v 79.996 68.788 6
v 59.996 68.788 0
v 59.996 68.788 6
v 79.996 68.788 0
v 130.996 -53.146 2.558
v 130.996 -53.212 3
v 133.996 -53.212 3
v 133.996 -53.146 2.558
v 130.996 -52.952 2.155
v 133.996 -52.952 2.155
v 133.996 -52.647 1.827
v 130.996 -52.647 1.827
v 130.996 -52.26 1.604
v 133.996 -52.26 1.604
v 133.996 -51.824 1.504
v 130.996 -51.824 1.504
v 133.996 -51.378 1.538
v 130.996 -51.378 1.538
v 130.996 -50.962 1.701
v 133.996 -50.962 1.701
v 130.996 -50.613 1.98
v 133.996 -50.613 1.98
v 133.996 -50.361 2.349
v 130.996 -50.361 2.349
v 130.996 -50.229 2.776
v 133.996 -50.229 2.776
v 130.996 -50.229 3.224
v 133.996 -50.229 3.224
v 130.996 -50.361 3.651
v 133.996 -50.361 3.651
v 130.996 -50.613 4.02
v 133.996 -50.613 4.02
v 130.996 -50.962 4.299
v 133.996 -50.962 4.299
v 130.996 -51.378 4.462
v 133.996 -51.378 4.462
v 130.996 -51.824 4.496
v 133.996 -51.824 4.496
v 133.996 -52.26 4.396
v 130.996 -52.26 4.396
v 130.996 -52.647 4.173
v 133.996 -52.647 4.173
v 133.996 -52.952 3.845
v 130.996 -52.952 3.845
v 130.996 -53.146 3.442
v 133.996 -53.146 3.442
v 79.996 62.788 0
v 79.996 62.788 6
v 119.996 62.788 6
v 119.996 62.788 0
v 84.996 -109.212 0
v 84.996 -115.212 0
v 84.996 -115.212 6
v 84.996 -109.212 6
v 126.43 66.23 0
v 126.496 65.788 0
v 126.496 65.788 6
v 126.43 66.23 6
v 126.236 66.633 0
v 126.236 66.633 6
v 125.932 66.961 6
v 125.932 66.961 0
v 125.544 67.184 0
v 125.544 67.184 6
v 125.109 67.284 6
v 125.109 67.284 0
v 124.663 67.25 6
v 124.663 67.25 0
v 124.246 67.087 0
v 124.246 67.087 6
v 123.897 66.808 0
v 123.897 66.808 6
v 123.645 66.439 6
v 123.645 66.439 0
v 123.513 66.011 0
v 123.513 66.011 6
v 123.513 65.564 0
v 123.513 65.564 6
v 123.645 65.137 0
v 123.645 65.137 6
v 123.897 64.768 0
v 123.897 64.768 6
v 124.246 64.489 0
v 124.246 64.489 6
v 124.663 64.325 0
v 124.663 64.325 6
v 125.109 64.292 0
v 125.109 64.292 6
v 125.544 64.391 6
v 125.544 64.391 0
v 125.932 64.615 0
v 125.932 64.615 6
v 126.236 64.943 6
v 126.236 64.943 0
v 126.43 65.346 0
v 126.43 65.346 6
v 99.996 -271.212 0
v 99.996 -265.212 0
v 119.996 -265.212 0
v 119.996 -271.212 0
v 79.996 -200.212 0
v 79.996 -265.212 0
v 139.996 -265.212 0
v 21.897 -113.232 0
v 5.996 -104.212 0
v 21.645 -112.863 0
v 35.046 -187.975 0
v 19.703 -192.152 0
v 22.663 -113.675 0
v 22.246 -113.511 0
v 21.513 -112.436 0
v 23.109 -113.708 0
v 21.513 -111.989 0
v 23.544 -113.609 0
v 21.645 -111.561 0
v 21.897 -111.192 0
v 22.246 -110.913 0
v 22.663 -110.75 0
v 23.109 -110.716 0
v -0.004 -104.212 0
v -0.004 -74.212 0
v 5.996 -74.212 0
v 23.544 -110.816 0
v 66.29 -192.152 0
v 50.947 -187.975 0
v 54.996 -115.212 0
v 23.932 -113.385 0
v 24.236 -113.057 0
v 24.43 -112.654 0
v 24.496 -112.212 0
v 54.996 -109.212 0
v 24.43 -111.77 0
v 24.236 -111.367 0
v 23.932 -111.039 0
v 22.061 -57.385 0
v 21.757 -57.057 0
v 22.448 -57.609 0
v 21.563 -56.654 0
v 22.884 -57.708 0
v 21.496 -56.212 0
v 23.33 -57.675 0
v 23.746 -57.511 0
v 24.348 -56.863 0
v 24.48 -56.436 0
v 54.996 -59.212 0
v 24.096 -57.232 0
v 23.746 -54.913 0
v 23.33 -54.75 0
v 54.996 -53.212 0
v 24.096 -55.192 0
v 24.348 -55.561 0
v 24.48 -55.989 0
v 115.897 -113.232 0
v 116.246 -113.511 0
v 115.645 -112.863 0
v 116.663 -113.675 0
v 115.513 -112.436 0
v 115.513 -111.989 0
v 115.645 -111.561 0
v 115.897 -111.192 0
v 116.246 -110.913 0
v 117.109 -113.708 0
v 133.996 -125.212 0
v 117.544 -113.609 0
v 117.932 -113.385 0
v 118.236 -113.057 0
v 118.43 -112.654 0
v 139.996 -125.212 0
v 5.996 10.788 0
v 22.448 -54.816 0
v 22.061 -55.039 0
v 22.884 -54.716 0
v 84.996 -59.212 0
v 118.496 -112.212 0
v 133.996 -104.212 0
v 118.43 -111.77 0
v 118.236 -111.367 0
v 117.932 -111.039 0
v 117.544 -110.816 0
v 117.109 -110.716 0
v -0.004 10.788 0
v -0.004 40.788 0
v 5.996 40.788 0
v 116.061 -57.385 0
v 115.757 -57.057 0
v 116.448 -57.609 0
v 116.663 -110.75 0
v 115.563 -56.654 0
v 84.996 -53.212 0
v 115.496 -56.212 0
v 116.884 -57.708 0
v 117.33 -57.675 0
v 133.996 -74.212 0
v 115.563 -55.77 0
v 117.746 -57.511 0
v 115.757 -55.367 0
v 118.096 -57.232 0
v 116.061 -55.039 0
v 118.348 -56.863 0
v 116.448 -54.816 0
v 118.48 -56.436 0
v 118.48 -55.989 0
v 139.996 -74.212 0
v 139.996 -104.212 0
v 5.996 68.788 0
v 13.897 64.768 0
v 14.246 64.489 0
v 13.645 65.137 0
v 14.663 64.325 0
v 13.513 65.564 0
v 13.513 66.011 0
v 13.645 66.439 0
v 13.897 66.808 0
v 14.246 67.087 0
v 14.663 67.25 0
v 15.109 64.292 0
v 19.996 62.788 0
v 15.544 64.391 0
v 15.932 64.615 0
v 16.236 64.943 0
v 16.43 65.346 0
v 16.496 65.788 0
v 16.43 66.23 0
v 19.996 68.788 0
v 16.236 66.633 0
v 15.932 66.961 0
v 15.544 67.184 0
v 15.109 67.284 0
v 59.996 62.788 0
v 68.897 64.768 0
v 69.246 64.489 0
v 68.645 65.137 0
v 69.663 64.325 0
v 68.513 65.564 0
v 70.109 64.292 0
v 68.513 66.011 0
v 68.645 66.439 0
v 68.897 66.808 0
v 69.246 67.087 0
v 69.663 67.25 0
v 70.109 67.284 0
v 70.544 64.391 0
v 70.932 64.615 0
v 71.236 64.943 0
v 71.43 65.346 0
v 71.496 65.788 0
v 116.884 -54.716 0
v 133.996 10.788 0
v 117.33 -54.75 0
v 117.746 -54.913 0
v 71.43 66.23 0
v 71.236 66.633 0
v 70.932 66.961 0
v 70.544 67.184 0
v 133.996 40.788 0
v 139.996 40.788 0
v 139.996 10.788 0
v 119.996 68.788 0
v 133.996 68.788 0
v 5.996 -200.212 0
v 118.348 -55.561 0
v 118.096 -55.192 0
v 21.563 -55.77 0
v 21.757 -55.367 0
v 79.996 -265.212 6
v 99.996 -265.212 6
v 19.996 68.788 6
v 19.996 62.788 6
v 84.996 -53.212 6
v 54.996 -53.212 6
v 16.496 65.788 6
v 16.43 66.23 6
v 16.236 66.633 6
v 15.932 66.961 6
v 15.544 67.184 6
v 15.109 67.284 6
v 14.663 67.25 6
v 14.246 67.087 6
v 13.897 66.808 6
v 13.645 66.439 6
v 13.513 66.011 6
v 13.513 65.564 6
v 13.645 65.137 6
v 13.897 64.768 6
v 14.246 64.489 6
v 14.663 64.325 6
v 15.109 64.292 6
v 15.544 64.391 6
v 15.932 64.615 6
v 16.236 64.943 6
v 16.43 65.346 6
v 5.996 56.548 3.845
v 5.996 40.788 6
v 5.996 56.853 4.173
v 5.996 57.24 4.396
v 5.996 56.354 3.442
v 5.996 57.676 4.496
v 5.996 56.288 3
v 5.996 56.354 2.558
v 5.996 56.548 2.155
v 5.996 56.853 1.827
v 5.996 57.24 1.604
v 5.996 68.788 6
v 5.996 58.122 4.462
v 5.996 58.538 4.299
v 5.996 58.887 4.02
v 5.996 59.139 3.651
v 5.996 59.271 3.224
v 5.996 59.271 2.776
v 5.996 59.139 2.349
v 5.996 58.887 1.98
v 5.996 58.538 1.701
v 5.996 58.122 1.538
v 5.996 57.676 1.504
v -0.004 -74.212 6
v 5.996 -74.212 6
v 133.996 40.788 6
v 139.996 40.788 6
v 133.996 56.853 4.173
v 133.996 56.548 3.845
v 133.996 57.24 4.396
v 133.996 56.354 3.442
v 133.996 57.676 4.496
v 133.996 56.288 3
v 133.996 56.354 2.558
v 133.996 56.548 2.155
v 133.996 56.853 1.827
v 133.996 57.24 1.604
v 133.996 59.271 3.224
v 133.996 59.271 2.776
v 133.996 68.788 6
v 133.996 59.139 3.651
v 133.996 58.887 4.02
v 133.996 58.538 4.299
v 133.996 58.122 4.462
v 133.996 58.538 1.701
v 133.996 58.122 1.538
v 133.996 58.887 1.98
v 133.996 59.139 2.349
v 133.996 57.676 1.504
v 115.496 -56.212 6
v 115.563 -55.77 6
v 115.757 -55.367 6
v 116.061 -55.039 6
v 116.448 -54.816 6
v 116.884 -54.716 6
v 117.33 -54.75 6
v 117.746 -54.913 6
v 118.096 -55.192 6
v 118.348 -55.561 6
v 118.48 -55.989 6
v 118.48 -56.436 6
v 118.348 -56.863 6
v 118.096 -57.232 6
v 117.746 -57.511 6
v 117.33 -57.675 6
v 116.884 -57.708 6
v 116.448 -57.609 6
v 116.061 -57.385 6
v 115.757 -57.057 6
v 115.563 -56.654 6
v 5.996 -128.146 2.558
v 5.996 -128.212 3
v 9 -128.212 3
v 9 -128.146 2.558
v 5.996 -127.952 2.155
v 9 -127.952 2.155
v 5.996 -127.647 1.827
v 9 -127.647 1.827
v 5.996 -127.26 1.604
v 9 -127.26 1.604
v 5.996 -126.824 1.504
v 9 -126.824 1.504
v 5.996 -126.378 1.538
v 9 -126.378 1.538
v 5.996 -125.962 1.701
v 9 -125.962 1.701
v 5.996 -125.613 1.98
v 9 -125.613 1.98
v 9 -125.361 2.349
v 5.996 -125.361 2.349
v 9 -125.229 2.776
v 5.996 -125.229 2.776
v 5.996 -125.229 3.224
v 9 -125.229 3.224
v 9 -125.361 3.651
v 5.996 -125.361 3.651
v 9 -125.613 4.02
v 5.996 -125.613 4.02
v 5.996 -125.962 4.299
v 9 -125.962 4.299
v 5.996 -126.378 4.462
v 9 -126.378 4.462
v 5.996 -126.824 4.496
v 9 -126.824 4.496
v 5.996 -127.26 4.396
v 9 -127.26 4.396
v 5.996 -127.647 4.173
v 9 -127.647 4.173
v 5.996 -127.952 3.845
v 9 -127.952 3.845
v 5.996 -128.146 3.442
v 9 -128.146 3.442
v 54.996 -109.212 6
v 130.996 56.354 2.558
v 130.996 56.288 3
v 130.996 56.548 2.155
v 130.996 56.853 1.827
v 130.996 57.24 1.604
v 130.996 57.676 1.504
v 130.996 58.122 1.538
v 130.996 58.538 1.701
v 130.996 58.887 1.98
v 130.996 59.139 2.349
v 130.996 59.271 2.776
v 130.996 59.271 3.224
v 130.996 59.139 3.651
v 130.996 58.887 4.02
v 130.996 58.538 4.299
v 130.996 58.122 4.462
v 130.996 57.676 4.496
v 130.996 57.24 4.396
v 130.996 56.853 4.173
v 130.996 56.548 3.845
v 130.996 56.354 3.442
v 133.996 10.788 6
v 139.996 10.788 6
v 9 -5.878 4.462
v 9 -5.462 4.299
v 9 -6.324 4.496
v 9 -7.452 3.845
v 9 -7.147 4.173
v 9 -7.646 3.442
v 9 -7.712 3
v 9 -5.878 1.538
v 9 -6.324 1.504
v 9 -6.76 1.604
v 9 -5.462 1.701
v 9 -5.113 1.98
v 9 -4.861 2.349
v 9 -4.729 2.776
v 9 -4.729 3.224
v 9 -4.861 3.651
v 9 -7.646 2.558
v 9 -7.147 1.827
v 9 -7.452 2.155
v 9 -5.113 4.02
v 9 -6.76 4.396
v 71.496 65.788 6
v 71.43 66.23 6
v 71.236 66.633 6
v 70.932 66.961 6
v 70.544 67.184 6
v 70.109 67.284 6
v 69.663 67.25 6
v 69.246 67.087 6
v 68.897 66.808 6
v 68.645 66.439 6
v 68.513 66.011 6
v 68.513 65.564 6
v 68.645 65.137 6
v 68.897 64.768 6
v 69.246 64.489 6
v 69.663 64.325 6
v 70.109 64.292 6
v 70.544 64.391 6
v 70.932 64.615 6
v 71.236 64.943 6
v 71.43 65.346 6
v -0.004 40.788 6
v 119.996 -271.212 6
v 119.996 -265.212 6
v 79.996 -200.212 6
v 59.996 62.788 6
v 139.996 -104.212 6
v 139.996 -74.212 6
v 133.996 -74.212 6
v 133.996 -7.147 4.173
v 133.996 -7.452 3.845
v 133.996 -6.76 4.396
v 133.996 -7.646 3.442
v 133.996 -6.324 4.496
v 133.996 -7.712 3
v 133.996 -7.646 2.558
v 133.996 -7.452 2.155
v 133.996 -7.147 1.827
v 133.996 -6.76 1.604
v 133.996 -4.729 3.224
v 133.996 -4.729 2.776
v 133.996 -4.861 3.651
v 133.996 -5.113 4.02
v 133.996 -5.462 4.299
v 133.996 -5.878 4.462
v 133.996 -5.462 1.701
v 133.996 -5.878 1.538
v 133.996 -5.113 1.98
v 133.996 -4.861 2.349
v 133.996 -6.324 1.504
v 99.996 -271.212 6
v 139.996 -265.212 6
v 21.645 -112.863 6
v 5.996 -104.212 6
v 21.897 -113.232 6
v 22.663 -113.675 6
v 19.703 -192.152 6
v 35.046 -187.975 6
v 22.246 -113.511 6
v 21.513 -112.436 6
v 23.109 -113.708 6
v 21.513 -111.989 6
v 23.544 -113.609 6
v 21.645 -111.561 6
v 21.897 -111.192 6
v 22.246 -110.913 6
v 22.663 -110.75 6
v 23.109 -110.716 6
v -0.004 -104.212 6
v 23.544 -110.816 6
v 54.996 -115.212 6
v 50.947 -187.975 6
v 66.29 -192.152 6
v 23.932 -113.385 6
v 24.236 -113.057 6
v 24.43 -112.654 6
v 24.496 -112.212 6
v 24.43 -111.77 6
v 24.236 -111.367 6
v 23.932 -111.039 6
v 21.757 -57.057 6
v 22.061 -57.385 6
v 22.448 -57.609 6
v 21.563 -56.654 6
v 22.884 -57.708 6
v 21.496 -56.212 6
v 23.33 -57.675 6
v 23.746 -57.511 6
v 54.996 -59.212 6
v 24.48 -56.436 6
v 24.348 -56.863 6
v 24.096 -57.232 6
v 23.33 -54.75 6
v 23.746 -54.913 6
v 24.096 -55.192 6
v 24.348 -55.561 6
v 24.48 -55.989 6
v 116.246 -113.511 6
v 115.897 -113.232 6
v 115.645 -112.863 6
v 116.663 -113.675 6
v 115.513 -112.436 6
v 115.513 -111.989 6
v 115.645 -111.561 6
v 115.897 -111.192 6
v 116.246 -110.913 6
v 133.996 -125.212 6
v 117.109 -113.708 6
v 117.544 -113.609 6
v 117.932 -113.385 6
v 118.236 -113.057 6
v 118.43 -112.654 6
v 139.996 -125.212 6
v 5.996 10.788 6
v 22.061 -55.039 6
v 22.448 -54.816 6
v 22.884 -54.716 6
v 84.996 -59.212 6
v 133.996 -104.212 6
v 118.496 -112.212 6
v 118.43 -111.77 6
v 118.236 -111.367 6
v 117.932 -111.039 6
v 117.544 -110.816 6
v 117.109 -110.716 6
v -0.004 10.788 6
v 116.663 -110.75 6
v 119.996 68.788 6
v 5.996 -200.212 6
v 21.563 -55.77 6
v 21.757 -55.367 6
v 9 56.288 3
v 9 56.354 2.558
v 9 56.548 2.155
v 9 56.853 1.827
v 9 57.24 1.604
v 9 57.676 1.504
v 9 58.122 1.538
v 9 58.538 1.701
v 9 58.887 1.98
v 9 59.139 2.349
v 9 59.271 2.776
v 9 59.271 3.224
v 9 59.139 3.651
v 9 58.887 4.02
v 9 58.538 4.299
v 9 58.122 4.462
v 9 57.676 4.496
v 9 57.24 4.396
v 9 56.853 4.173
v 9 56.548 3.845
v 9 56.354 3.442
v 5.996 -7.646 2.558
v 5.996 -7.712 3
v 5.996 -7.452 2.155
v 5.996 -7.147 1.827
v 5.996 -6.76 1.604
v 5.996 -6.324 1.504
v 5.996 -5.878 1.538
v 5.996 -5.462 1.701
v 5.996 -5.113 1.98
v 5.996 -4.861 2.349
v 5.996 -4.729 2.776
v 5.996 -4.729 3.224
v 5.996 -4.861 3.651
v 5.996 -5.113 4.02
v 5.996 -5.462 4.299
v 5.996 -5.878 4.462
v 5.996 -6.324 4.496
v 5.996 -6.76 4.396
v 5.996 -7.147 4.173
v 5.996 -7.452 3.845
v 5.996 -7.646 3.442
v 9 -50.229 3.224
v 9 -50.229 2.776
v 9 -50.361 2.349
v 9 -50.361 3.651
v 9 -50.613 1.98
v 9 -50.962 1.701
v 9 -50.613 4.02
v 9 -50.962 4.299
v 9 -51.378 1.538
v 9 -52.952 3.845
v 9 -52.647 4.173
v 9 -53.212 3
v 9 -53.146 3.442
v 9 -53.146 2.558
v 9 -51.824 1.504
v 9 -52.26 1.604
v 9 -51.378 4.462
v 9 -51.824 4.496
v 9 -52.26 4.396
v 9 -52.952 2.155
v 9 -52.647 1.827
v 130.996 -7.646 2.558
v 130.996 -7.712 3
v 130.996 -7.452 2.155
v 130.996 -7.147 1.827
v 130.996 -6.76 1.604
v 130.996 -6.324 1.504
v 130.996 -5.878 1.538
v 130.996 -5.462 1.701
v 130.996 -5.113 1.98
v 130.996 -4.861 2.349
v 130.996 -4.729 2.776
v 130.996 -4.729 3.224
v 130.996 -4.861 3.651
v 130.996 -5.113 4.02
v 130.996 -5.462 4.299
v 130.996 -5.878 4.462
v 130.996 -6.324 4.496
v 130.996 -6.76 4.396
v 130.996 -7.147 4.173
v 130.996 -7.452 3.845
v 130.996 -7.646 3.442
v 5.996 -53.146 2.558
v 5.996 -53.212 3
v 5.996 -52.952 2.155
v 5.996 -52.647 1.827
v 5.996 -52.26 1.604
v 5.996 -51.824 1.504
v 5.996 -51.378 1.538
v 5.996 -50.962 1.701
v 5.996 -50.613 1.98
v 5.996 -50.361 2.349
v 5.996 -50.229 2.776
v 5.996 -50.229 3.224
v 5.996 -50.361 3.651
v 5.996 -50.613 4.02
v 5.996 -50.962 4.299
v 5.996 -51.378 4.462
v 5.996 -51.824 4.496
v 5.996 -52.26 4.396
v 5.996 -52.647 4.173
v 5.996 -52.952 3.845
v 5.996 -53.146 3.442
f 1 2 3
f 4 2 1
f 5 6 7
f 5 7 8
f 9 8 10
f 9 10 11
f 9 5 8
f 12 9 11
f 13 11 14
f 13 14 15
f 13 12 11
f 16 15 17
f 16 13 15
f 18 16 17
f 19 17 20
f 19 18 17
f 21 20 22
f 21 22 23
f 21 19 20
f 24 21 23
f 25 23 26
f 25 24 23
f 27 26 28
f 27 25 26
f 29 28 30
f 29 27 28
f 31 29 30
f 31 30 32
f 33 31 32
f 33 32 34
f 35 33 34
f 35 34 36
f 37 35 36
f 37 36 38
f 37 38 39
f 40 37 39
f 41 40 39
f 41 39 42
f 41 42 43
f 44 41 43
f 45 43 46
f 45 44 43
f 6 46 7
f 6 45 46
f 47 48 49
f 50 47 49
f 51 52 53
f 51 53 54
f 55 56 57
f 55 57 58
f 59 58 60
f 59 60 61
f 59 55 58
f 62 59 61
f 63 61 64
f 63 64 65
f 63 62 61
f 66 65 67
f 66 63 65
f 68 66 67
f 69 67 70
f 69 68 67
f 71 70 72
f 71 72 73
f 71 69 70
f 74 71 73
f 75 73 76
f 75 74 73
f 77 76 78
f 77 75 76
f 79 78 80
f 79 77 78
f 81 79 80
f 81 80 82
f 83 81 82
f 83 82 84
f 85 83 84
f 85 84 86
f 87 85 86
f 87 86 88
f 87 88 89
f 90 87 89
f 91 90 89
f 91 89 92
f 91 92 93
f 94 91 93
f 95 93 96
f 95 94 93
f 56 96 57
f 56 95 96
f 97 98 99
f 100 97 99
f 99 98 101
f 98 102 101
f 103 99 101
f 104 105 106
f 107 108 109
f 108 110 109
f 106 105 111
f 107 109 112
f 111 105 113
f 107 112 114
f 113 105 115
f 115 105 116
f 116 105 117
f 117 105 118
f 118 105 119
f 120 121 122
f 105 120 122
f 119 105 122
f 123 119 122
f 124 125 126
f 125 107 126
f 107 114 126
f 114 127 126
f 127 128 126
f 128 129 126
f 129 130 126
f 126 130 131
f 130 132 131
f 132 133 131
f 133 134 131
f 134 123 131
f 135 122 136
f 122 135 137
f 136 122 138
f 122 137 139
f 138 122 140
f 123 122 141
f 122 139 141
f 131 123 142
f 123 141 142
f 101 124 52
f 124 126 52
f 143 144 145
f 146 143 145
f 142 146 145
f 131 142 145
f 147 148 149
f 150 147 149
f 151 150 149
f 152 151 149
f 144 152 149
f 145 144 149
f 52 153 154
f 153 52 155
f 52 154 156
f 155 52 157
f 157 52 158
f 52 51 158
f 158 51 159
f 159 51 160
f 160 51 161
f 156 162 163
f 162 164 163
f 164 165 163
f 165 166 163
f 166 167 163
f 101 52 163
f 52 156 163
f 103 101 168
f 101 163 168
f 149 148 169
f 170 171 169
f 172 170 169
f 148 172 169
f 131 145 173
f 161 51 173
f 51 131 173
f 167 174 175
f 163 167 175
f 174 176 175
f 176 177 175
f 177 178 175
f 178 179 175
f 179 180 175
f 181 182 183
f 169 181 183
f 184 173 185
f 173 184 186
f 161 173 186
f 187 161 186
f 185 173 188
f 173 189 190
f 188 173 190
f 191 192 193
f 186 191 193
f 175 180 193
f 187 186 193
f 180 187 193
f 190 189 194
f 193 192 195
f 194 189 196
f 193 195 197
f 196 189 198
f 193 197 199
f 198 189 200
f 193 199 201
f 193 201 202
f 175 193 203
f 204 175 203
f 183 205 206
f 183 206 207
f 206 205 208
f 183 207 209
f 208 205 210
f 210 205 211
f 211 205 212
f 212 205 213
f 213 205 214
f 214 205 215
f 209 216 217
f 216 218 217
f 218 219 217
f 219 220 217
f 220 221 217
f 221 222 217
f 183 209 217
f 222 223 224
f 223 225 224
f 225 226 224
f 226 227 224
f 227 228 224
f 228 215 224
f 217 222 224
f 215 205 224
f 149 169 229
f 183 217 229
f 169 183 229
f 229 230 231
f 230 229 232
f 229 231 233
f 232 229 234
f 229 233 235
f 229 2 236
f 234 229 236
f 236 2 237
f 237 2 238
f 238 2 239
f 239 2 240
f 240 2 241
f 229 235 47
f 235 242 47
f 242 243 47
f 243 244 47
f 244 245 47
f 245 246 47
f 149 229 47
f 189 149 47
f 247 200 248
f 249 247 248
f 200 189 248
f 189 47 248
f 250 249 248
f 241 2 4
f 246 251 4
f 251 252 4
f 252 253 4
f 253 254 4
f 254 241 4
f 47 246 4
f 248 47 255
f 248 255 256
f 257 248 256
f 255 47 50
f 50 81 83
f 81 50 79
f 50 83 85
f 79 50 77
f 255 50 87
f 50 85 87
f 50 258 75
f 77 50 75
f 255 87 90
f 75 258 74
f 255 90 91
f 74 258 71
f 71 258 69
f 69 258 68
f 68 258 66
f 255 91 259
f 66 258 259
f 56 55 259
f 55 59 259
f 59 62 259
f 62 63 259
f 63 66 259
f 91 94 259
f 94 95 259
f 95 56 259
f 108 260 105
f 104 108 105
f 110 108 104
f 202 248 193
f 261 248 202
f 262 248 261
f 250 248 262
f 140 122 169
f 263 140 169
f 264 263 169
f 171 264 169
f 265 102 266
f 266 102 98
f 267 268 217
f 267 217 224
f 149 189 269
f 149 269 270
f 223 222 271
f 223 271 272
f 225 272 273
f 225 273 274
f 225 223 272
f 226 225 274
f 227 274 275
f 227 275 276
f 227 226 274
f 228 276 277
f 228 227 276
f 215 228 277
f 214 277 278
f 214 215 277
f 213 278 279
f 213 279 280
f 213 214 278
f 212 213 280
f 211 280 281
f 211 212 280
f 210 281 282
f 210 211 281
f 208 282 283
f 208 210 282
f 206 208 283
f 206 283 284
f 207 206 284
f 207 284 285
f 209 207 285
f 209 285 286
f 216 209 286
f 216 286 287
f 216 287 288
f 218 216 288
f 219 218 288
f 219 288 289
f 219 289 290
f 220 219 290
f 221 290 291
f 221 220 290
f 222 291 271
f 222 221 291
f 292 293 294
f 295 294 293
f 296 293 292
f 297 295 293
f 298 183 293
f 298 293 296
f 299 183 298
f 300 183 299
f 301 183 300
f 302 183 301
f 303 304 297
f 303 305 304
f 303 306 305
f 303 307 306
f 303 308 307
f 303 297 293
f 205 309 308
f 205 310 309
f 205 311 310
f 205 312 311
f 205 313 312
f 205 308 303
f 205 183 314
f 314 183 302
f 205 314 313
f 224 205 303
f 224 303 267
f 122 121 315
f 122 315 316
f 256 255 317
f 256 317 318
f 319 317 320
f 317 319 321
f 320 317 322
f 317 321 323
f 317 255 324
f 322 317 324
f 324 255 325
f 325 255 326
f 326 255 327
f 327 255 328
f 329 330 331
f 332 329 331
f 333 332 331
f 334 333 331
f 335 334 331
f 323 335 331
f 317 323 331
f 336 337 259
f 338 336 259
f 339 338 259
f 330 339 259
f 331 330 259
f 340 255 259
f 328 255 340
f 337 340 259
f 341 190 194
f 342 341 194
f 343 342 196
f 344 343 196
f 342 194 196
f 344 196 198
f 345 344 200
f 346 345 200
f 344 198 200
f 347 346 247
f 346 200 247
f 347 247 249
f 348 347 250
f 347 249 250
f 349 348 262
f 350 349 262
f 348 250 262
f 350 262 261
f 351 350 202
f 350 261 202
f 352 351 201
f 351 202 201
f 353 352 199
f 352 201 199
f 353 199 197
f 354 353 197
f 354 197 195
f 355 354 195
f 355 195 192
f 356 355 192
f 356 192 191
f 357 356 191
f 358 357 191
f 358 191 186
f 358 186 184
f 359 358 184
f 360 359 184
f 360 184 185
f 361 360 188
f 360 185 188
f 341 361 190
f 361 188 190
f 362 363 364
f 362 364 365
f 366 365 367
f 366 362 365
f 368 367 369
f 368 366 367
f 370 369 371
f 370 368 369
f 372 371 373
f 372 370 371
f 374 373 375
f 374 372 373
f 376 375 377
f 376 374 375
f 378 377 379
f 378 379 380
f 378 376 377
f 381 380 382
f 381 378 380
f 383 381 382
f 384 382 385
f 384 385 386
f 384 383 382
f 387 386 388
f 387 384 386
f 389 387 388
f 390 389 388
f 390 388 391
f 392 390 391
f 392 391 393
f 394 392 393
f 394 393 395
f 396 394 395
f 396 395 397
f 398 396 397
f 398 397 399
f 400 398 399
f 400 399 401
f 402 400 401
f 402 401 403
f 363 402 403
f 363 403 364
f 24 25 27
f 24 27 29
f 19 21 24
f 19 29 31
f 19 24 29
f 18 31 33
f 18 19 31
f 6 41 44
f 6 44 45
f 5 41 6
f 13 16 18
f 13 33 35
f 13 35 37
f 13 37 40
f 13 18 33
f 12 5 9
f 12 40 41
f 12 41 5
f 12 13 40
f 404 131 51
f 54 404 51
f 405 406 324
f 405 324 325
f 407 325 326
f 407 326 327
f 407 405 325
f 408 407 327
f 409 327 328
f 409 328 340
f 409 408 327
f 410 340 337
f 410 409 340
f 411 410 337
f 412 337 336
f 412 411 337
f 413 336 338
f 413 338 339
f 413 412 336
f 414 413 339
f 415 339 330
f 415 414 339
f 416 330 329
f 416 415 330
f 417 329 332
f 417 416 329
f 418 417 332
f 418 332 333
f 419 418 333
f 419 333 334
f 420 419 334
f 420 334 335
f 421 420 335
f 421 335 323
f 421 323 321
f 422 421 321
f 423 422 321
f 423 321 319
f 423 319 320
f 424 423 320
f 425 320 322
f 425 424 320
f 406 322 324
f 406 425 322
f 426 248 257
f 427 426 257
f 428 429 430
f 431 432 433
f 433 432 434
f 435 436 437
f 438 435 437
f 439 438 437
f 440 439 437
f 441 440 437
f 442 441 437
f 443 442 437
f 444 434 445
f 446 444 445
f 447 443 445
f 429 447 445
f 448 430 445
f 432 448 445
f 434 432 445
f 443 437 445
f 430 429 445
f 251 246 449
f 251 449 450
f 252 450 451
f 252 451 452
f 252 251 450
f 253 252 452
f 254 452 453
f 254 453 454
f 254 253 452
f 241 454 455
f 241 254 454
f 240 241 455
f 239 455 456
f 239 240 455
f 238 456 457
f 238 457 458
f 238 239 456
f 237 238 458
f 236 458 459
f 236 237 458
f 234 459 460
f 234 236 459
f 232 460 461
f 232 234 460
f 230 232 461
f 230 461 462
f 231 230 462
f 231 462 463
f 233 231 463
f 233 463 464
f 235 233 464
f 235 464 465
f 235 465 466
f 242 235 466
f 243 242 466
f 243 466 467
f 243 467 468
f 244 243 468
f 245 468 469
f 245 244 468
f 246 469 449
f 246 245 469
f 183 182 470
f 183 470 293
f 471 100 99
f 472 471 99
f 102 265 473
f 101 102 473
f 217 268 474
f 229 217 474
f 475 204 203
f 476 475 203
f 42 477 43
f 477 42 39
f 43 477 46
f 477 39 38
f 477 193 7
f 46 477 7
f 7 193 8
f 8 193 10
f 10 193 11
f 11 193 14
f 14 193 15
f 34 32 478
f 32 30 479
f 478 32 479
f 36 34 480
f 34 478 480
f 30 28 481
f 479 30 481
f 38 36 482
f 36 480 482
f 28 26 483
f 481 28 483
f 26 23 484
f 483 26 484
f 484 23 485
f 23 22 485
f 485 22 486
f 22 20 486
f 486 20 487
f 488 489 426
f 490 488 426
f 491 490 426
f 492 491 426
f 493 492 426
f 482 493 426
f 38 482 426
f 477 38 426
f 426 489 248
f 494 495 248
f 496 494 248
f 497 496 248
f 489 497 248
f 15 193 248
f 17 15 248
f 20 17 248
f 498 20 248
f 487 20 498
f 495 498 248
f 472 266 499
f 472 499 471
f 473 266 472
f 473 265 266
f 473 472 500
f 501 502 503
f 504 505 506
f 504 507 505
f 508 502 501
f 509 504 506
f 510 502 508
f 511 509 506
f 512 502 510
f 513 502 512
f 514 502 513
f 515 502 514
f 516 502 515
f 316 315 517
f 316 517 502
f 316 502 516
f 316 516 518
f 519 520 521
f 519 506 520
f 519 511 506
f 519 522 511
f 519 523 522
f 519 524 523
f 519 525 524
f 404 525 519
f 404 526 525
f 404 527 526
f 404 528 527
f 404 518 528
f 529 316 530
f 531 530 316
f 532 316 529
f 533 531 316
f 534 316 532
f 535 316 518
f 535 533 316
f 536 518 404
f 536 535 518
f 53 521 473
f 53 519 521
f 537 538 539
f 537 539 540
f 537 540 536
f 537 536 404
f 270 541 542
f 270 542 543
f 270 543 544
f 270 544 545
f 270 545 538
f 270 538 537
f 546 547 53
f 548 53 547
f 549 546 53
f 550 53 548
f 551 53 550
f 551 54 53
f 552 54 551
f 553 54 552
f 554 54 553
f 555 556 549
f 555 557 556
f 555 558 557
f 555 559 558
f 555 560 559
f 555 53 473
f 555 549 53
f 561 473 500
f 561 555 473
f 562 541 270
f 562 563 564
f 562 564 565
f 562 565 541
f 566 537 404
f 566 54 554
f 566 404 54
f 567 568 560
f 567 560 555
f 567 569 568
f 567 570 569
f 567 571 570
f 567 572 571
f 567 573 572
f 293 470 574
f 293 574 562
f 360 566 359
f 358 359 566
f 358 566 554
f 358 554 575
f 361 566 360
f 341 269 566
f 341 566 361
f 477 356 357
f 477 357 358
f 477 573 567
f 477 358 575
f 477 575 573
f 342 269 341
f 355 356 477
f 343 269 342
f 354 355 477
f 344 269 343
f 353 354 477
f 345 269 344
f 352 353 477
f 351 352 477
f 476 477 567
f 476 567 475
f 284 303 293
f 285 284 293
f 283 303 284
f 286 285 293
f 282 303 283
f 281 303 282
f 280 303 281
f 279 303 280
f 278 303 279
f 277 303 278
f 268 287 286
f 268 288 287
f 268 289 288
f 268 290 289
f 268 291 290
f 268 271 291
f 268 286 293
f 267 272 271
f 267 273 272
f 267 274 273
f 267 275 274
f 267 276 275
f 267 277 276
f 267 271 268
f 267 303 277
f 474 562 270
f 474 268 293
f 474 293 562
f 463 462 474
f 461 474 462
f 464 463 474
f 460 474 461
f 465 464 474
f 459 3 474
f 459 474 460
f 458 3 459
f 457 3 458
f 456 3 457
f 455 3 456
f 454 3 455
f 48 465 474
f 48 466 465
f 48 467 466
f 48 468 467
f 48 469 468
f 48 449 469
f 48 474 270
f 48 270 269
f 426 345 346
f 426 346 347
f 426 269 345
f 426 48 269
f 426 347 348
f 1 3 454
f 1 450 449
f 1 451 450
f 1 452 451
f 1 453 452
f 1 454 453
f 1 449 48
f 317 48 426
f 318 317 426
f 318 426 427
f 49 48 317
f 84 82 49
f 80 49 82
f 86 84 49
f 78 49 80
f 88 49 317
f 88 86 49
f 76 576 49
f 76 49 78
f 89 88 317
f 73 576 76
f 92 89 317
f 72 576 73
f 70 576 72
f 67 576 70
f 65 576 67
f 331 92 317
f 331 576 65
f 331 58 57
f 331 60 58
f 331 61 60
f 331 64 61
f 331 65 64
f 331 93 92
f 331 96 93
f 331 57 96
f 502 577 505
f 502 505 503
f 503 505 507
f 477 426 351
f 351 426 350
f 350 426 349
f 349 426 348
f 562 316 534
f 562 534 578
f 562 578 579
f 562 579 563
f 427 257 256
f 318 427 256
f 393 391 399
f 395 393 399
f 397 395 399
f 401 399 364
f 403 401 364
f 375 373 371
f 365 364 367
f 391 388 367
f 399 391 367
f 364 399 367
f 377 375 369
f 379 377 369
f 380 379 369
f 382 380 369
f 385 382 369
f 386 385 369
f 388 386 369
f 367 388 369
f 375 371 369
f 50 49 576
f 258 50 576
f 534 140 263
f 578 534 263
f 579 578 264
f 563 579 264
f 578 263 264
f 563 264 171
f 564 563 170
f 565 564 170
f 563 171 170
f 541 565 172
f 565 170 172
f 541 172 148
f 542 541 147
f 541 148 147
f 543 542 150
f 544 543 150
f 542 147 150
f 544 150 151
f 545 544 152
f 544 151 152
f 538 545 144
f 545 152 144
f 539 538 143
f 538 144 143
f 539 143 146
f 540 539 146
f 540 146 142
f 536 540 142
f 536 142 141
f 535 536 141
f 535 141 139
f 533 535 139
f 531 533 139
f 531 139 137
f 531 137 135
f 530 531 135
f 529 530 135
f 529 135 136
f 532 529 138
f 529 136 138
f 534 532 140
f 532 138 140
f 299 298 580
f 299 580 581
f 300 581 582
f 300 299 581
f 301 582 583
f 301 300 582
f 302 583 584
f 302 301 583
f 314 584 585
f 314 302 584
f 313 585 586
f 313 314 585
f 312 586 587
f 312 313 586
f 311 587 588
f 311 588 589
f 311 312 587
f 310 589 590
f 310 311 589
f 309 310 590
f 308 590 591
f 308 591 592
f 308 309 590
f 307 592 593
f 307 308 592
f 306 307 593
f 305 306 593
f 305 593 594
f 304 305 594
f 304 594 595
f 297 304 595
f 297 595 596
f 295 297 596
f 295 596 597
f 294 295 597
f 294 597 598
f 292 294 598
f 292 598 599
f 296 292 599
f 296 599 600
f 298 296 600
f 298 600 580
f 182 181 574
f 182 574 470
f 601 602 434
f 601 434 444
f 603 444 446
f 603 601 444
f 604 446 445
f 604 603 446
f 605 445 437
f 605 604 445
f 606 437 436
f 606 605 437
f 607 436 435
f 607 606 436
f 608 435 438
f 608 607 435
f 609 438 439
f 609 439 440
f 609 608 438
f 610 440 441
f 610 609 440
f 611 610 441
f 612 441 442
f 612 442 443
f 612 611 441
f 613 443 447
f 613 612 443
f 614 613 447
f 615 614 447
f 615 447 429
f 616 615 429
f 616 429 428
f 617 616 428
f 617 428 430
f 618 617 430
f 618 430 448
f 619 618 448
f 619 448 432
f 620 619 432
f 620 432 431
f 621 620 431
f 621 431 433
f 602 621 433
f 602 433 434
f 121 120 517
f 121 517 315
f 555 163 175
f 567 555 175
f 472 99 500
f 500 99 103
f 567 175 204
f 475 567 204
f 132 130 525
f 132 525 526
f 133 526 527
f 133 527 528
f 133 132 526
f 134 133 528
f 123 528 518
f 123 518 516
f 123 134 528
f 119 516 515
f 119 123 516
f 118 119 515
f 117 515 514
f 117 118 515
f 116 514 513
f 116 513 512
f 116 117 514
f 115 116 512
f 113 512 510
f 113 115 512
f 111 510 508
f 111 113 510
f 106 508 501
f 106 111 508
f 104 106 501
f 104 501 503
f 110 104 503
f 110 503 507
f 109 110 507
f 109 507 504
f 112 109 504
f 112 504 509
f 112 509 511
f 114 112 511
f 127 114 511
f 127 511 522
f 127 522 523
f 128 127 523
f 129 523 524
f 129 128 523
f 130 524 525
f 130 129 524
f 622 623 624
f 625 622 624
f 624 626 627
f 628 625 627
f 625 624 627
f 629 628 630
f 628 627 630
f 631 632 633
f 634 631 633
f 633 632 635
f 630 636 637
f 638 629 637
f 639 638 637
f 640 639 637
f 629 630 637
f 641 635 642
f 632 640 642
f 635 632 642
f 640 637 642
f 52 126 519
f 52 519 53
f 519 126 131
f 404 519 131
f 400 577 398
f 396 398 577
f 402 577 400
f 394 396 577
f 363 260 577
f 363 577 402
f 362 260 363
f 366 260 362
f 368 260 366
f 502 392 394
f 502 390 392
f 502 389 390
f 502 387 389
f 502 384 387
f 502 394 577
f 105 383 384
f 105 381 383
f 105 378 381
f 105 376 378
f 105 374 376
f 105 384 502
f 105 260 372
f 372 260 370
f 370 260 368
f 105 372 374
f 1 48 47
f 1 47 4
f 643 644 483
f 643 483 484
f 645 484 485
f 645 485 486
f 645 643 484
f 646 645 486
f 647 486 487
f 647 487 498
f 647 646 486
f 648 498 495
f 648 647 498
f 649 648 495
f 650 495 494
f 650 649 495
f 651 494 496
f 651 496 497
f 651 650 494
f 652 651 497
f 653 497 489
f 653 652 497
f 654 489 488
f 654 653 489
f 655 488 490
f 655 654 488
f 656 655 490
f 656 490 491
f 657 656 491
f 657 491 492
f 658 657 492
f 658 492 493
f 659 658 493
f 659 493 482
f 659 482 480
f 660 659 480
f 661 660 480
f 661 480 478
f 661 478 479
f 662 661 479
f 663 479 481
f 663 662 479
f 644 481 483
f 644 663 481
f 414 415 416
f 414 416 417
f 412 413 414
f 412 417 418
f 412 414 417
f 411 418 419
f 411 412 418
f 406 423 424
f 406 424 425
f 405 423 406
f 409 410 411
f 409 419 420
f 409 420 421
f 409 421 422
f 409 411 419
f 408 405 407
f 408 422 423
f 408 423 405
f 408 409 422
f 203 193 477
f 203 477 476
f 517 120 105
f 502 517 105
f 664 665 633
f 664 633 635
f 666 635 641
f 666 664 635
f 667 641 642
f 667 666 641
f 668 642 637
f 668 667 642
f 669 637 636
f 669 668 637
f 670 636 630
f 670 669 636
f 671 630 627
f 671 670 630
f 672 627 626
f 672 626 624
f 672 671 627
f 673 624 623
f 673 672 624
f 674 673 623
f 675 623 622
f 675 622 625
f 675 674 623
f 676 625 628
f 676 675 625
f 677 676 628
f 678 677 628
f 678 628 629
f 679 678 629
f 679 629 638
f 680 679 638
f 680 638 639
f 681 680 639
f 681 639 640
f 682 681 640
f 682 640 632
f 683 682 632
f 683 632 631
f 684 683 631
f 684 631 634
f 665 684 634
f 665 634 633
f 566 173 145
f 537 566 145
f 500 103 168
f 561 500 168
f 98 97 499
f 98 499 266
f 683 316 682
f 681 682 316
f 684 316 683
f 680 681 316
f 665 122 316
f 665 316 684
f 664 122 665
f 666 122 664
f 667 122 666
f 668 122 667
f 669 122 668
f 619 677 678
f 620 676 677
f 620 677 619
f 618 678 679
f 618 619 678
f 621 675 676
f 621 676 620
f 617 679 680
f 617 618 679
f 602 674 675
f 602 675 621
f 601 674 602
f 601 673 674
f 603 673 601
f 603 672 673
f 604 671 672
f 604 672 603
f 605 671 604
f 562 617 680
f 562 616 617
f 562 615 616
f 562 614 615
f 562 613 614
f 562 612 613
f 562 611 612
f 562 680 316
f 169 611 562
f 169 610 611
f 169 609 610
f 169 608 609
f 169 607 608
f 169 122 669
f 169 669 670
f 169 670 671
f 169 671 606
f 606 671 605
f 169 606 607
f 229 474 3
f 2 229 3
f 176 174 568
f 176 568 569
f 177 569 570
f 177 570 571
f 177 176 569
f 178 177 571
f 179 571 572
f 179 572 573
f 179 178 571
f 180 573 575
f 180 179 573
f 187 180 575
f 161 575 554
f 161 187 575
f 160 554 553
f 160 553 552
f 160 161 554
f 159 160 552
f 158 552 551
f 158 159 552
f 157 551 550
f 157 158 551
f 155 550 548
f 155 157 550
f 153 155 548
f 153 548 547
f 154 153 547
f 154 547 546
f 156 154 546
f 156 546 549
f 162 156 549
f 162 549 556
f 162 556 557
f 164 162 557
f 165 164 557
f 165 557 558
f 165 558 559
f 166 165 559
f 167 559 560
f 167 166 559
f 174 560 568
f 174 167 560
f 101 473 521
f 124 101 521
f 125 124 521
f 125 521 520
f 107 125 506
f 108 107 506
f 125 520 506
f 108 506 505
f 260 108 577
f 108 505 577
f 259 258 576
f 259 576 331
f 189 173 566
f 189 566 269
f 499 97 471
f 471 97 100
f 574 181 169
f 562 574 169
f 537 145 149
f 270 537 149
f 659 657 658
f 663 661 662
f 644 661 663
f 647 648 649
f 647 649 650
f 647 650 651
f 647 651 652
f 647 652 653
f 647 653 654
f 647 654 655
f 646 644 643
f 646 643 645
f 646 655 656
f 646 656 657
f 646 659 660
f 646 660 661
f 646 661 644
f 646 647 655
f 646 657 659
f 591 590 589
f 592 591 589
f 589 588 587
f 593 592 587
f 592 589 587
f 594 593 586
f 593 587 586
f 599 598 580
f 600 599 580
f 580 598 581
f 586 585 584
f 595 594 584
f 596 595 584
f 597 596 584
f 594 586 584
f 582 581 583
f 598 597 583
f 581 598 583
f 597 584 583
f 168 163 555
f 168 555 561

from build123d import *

# Parameters (mm, degrees)
ESQUISSE1_W              = 140
ESQUISSE1_H              = 340
ESQUISSE1_R              = 1.5
ESQUISSE1_W_2            = 30
ESQUISSE1_H_2            = 6
BOSS_EXTRU_3_DEPTH       = 6
ESQUISSE4_W              = 6
ESQUISSE4_H              = 28
ESQUISSE4_H_2            = 85
ESQUISSE4_H_3            = 51
ESQUISSE4_H_4            = 21
ENL_V_MAT_EXTRU_2_DEPTH  = 6
ESQUISSE5_R              = 1.5
ENL_V_MAT_EXTRU_3_DEPTH  = 9
ENL_V_START              = -3
ESQUISSE6_R              = 1.5
ENL_V_MAT_EXTRU_6_DEPTH  = 3
ESQUISSE7_W              = 20
ESQUISSE7_H              = 6
ENL_V_MAT_EXTRU_7_DEPTH  = 10
ENL_V_MAT_EXTRU_8_DEPTH  = 6
ESQUISSE9_W              = 40
ESQUISSE9_H              = 6
ENL_V_MAT_EXTRU_9_DEPTH  = 6
ESQUISSE10_R             = 1.5
ESQUISSE10_W             = 30
ESQUISSE10_H             = 6
ENL_V_MAT_EXTRU_10_DEPTH = 6


with BuildPart() as part:
    # Esquisse1 → Boss.-Extru.3 (new body)
    with BuildSketch(Plane.XY):
        with Locations((69.996437878, -101.21224042)):
            Rectangle(ESQUISSE1_W, ESQUISSE1_H)
        with Locations((14.996437878, 65.78775958)):
            Circle(ESQUISSE1_R, mode=Mode.SUBTRACT)
        with Locations((124.996437878, 65.78775958)):
            Circle(ESQUISSE1_R, mode=Mode.SUBTRACT)
        with Locations((69.996437878, 65.78775958)):
            Circle(ESQUISSE1_R, mode=Mode.SUBTRACT)
        with Locations((22.996437878, -112.21224042)):
            Circle(ESQUISSE1_R, mode=Mode.SUBTRACT)
        with Locations((116.996437878, -112.21224042)):
            Circle(ESQUISSE1_R, mode=Mode.SUBTRACT)
        with Locations((69.996437878, -112.21224042)):
            Rectangle(ESQUISSE1_W_2, ESQUISSE1_H_2, mode=Mode.SUBTRACT)
    extrude(amount=BOSS_EXTRU_3_DEPTH)

    # Esquisse4 → Enlèv. mat.-Extru.2 (cut)
    with BuildSketch(Plane.XY):
        with Locations((2.996437878, 54.78775958)):
            Rectangle(ESQUISSE4_W, ESQUISSE4_H)
        with Locations((2.996437878, -31.71224042)):
            Rectangle(ESQUISSE4_W, ESQUISSE4_H_2)
        with Locations((2.996437878, -129.71224042)):
            Rectangle(ESQUISSE4_W, ESQUISSE4_H_3)
        with Locations((136.996437878, -114.71224042)):
            Rectangle(ESQUISSE4_W, ESQUISSE4_H_4)
        with Locations((136.996437878, -31.71224042)):
            Rectangle(ESQUISSE4_W, ESQUISSE4_H_2)
        with Locations((136.996437878, 54.78775958)):
            Rectangle(ESQUISSE4_W, ESQUISSE4_H)
    extrude(amount=ENL_V_MAT_EXTRU_2_DEPTH, mode=Mode.SUBTRACT)

    # Esquisse5 → Enlèv. mat.-Extru.3 (cut)
    with BuildSketch(Plane(origin=(0, 0, 0), x_dir=(0, 0, -1), z_dir=(1, 0, 0))):
        with Locations(Location((-3, -126.71224042, 0), (0, 0, 270))):
            Circle(ESQUISSE5_R)
        with Locations(Location((-3, -51.71224042, 0), (0, 0, 270))):
            Circle(ESQUISSE5_R)
        with Locations(Location((-3, -6.21224042, 0), (0, 0, 270))):
            Circle(ESQUISSE5_R)
        with Locations(Location((-3, 57.78775958, 0), (0, 0, 270))):
            Circle(ESQUISSE5_R)
    extrude(amount=ENL_V_MAT_EXTRU_3_DEPTH, mode=Mode.SUBTRACT)

    # Esquisse6 → Enlèv. mat.-Extru.6 (cut)
    with BuildSketch(Plane(origin=(133.996437878, 0, 0), x_dir=(0, 0, -1), z_dir=(1, 0, 0)).offset(ENL_V_START)):
        with Locations(Location((-3, -6.21224042, 0), (0, 0, 270))):
            Circle(ESQUISSE6_R)
        with Locations(Location((-3, -51.71224042, 0), (0, 0, 270))):
            Circle(ESQUISSE6_R)
        with Locations(Location((-3, 57.78775958, 0), (0, 0, 270))):
            Circle(ESQUISSE6_R)
    extrude(amount=ENL_V_MAT_EXTRU_6_DEPTH, mode=Mode.SUBTRACT)

    # Esquisse7 → Enlèv. mat.-Extru.7 (cut)
    with BuildSketch(Plane.XY):
        with Locations((129.996437878, -268.21224042)):
            Rectangle(ESQUISSE7_W, ESQUISSE7_H)
        with Locations((89.996437878, -268.21224042)):
            Rectangle(ESQUISSE7_W, ESQUISSE7_H)
    extrude(amount=ENL_V_MAT_EXTRU_7_DEPTH, mode=Mode.SUBTRACT)

    # Esquisse8 → Enlèv. mat.-Extru.8 (cut)
    with BuildSketch(Plane.XY.offset(6)):
        with BuildLine():
            Line((79.996437878, -265.21224042), (79.996437878, -200.21224042))
            ThreePointArc((79.996437878, -200.21224042), (42.996437878, -187.445703134), (5.996437878, -200.21224042))
            Line((5.996437878, -200.21224042), (5.996437878, -155.21224042))
            Line((5.996437878, -155.21224042), (-0.003562122, -155.21224042))
            Line((-0.003562122, -155.21224042), (-0.003562122, -271.21224042))
            Line((-0.003562122, -271.21224042), (79.996437878, -271.21224042))
            Line((79.996437878, -271.21224042), (79.996437878, -265.21224042))
        make_face()
    extrude(amount=-ENL_V_MAT_EXTRU_8_DEPTH, mode=Mode.SUBTRACT)

    # Esquisse9 → Enlèv. mat.-Extru.9 (cut)
    with BuildSketch(Plane.XY.offset(6)):
        with Locations((39.996437878, 65.78775958)):
            Rectangle(ESQUISSE9_W, ESQUISSE9_H)
        with Locations((99.996437878, 65.78775958)):
            Rectangle(ESQUISSE9_W, ESQUISSE9_H)
    extrude(amount=-ENL_V_MAT_EXTRU_9_DEPTH, mode=Mode.SUBTRACT)

    # Esquisse10 → Enlèv. mat.-Extru.10 (cut)
    with BuildSketch(Plane(origin=(0, 0, 0), x_dir=(-1, 0, 0), z_dir=(0, 0, -1))):
        with Locations((-116.996437878, -56.21224042)):
            Circle(ESQUISSE10_R)
        with Locations((-22.996437878, -56.21224042)):
            Circle(ESQUISSE10_R)
        with Locations((-69.996437878, -56.21224042)):
            Rectangle(ESQUISSE10_W, ESQUISSE10_H)
    extrude(amount=-ENL_V_MAT_EXTRU_10_DEPTH, mode=Mode.SUBTRACT)


solid = part.part
